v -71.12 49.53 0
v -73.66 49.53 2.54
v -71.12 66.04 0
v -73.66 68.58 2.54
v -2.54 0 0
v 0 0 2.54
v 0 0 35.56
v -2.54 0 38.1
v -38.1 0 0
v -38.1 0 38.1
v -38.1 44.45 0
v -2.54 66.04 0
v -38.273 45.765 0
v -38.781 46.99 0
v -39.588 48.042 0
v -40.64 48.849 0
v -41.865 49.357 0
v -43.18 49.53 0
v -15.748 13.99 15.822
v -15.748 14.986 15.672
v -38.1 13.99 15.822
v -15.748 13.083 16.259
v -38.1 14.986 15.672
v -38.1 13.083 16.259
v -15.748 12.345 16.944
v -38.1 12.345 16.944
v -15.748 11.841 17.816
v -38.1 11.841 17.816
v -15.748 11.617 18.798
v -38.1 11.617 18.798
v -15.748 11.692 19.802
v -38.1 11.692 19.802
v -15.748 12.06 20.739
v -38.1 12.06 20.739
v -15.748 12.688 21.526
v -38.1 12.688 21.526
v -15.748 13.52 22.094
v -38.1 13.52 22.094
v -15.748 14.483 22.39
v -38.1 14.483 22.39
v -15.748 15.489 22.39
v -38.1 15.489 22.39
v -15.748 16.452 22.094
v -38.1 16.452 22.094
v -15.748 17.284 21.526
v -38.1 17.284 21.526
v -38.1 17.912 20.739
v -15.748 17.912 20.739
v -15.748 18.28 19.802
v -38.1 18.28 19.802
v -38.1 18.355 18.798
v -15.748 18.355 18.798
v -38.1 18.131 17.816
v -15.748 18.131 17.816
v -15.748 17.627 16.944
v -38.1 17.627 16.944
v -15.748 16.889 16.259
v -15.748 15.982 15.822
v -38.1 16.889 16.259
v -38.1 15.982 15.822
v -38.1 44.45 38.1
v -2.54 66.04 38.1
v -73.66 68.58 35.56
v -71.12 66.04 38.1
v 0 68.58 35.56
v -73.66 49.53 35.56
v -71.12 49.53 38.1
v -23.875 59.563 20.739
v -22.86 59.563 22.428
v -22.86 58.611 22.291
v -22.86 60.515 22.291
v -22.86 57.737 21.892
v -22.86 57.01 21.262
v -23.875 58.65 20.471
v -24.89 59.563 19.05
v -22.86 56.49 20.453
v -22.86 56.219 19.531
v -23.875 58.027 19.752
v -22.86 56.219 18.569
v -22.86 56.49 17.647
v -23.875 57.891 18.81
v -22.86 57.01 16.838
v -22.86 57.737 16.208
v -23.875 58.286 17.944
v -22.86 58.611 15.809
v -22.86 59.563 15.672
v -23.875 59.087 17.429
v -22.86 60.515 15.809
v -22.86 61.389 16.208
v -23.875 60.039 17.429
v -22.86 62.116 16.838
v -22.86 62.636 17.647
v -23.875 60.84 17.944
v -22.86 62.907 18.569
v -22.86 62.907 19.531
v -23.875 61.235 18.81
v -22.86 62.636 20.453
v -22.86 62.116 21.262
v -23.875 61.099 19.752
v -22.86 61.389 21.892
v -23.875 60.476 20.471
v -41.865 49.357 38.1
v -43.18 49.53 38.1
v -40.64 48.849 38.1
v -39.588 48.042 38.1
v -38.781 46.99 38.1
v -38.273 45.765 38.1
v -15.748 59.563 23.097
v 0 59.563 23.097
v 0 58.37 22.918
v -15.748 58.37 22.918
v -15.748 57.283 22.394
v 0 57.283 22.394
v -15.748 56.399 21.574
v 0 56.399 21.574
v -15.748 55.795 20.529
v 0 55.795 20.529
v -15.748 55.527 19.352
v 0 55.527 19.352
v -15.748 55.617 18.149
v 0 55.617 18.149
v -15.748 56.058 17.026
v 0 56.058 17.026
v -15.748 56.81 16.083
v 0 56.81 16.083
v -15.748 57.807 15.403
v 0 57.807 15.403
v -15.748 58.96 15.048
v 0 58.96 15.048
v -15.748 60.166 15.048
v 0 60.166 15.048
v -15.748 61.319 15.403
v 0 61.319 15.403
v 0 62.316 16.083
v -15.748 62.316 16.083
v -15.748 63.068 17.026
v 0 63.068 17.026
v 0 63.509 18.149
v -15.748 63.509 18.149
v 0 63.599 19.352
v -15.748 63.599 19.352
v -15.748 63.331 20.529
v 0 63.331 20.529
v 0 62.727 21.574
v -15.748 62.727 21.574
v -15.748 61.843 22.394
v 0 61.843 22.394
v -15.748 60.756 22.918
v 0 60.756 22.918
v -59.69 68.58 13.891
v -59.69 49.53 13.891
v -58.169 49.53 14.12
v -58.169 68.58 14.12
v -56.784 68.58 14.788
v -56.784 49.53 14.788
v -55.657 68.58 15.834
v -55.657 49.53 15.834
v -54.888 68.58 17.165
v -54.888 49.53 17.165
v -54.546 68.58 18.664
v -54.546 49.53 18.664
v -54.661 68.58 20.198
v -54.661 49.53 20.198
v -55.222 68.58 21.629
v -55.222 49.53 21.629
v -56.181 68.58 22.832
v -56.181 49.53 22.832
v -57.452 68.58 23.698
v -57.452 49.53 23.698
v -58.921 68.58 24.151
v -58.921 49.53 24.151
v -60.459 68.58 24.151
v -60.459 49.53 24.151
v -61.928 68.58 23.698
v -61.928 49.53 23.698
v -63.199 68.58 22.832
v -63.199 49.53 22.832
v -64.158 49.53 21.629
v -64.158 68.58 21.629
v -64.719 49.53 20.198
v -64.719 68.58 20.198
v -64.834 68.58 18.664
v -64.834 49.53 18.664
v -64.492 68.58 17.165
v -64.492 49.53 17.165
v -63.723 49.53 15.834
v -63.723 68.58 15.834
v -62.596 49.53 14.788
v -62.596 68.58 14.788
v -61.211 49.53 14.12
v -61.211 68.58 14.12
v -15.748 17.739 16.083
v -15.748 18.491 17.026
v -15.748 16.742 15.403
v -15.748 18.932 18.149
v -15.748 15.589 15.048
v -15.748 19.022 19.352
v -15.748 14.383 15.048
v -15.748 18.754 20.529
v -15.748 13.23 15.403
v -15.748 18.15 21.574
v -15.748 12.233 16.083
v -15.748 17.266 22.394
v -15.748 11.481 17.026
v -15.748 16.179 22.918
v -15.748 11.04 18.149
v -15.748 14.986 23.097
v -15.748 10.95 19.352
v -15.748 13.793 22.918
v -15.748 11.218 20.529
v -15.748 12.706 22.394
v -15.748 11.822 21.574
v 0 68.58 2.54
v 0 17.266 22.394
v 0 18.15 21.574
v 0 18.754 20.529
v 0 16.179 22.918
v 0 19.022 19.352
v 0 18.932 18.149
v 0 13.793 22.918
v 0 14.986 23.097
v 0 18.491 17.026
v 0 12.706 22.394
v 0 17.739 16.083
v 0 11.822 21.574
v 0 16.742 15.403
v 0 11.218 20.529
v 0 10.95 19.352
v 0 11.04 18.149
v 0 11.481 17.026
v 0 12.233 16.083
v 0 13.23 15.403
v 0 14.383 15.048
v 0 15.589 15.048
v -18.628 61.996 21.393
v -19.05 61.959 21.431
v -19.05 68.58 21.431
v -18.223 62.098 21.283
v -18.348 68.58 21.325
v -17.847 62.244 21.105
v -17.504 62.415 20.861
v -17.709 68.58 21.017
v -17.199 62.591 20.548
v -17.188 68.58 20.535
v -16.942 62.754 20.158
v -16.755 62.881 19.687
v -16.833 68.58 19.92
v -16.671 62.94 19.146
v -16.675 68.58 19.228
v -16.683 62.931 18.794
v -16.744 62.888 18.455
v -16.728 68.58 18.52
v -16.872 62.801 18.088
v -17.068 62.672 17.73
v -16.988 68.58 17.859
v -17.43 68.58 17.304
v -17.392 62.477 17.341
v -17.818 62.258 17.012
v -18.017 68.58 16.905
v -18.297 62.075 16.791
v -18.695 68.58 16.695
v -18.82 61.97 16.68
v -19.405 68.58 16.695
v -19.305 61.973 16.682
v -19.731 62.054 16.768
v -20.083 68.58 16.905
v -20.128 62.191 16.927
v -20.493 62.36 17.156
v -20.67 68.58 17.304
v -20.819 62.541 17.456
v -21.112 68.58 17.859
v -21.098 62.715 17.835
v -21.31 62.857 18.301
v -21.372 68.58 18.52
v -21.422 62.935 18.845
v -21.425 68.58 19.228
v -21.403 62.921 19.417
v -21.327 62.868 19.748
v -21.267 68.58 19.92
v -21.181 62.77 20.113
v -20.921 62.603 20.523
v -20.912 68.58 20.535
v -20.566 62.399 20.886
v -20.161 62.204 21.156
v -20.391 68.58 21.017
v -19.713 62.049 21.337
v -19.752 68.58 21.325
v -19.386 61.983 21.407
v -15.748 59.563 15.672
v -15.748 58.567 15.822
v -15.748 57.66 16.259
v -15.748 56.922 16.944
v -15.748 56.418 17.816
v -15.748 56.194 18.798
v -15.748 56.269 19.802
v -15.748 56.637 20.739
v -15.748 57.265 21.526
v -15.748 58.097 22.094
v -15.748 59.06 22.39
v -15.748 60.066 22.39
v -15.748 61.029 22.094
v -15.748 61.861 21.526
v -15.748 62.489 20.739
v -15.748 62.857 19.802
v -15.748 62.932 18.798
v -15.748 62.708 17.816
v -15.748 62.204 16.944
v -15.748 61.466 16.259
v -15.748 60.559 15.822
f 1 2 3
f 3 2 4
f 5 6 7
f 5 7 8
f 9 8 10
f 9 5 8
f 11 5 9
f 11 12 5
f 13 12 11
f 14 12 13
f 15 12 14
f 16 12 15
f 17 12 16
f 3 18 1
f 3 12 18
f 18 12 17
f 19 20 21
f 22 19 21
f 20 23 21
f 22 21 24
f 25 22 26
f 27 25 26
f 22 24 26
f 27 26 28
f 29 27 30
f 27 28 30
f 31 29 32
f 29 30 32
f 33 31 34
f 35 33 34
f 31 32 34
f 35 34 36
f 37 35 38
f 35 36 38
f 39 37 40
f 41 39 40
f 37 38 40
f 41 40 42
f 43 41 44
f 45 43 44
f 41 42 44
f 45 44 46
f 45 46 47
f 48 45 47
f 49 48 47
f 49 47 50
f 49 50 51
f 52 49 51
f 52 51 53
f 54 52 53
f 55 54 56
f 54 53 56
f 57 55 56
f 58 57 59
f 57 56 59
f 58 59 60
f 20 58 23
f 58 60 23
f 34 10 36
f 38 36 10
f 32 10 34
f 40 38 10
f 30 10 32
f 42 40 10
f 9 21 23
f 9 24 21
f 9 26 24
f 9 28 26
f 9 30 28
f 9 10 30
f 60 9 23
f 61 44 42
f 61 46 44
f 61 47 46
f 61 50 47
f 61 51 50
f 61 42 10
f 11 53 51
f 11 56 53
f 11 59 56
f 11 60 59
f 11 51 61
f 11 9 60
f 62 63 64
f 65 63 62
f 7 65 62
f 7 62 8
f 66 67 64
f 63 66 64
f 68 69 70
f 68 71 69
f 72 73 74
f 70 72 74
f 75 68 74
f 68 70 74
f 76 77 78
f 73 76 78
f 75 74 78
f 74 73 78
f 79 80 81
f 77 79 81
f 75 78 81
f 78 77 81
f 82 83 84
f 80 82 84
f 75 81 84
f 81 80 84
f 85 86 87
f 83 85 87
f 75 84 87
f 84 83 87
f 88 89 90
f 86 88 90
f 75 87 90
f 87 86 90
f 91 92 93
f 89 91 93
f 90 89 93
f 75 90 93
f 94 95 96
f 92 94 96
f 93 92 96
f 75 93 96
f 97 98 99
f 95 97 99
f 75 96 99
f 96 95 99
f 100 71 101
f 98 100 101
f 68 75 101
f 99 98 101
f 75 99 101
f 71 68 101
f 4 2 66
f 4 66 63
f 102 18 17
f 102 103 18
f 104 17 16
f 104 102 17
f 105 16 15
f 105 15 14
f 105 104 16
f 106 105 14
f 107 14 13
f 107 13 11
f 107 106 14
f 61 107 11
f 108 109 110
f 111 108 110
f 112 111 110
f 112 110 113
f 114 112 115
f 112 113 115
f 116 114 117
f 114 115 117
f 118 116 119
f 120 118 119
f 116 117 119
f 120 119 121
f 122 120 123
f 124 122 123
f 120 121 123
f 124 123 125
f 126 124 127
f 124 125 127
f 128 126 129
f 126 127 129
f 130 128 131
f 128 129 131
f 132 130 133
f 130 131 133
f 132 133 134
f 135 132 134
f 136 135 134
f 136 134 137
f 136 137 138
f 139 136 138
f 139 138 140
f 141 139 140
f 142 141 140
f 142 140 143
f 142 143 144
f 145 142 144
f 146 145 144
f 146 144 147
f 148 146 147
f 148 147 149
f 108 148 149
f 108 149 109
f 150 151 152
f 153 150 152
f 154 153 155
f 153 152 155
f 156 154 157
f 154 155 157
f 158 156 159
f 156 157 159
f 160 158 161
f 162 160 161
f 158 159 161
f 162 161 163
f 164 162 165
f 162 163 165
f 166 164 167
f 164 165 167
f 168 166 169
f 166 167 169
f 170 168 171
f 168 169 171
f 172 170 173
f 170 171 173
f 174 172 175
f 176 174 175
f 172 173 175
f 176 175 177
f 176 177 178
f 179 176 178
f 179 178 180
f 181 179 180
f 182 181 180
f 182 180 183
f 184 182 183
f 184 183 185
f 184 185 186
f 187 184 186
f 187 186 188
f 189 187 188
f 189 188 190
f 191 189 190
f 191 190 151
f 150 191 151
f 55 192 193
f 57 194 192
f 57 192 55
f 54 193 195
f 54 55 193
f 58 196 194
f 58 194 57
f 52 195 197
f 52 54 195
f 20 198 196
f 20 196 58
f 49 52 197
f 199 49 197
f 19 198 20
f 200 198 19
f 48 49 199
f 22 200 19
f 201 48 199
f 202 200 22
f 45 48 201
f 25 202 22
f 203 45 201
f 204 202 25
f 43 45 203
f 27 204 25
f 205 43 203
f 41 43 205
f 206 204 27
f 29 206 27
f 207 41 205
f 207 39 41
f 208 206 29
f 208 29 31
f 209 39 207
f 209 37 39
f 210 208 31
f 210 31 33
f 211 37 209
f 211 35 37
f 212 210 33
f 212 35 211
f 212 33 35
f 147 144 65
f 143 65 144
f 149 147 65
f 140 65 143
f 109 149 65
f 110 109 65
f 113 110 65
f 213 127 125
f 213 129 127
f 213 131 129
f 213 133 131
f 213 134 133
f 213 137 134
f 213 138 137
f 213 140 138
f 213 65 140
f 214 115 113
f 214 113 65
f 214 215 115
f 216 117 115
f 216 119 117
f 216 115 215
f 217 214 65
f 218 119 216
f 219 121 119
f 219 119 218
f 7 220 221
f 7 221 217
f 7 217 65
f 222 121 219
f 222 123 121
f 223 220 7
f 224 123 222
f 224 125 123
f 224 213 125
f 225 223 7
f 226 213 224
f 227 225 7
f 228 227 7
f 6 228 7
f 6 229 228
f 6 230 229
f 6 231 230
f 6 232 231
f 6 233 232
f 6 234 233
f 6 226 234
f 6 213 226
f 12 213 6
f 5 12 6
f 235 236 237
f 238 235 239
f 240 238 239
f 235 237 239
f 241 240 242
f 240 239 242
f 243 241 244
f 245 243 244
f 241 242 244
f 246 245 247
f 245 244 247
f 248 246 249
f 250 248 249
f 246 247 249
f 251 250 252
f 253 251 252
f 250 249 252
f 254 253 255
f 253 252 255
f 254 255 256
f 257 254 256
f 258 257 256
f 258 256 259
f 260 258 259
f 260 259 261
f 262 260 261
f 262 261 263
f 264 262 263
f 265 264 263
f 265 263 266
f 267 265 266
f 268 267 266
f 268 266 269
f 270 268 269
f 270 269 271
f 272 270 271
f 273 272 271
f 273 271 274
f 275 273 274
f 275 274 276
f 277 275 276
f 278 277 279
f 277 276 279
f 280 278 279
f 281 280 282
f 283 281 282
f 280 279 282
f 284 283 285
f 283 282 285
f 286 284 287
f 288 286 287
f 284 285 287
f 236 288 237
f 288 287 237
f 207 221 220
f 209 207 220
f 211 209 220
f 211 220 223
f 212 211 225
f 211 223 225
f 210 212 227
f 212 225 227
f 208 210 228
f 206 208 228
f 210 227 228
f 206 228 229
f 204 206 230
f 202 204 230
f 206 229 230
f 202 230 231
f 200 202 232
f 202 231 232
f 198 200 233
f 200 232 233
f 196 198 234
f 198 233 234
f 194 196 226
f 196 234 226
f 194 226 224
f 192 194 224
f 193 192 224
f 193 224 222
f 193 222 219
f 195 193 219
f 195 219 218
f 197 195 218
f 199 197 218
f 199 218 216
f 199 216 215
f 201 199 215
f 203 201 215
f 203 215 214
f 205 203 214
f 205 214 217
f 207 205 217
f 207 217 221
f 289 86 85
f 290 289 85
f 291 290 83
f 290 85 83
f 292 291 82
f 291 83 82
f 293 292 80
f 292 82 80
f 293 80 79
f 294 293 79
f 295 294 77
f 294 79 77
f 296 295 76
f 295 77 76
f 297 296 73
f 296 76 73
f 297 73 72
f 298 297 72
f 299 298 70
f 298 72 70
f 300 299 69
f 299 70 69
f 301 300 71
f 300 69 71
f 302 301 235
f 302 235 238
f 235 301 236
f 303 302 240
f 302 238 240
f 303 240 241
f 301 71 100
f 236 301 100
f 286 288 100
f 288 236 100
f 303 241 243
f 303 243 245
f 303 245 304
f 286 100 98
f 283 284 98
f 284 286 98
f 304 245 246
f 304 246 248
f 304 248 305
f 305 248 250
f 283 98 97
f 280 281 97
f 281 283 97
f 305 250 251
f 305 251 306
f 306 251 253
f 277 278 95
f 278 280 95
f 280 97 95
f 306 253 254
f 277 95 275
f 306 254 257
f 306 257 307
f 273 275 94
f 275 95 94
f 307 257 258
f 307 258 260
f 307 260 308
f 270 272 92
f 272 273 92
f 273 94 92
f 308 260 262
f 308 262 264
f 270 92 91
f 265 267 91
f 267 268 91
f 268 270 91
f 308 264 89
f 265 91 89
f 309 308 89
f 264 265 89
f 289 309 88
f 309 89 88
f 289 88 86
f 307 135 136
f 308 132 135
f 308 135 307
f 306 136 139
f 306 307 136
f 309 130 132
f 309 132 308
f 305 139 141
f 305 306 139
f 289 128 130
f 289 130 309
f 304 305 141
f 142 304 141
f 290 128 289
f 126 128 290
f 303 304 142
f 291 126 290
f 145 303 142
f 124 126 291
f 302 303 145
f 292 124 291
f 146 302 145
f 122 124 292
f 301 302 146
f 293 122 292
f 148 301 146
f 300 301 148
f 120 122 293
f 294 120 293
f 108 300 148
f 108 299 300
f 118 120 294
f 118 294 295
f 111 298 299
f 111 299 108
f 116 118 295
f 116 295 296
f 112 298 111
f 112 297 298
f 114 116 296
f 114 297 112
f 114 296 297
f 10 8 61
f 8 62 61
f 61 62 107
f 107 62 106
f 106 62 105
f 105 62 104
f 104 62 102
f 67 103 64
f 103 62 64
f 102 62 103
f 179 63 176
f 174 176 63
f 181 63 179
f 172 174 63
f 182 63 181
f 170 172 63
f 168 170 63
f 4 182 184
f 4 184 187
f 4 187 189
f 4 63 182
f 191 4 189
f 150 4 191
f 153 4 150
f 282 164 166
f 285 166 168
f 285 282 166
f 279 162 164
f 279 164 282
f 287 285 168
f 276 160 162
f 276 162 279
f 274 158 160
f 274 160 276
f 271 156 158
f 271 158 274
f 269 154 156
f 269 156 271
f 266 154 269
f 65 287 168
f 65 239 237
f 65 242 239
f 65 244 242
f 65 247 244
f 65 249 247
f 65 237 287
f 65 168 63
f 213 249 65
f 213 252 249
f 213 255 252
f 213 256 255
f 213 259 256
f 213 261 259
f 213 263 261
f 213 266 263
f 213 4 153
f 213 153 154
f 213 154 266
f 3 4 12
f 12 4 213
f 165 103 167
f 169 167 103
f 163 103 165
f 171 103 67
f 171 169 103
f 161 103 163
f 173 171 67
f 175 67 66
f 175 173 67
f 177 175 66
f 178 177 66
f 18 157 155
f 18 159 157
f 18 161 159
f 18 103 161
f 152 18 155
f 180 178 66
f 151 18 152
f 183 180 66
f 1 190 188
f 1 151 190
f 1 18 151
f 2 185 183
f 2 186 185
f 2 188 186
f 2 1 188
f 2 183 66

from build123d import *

# Parameters (mm, degrees)
EXTRUDE1_DEPTH                               = 38.1
F_3_8_CLEARANCE_HOLE1_D                      = 10.31748
TAPPED_HOLE_FOR_1_4_20_HELICOIL3_D           = 6.7564
TAPPED_HOLE_FOR_1_4_20_HELICOIL3_DEPTH       = 22.86
TAPPED_HOLE_FOR_1_4_20_HELICOIL3_CBORE_D     = 8.09498
TAPPED_HOLE_FOR_1_4_20_HELICOIL3_CBORE_DEPTH = 15.748
TAPPED_HOLE_FOR_1_4_20_HELICOIL3_TIP         = 2.029827343
TAPPED_HOLE_FOR_1_4_20_HELICOIL1_D           = 6.7564
TAPPED_HOLE_FOR_1_4_20_HELICOIL1_CBORE_D     = 8.09498
TAPPED_HOLE_FOR_1_4_20_HELICOIL1_CBORE_DEPTH = 15.748
FILLET1_R                                    = 5.08
F_3_16_0_1875_DIAMETER_HOLE1_REACH           = 70.58
F_3_16_0_1875_DIAMETER_HOLE1_BORE_R          = 2.38125
CHAMFER1_SIZE                                = 2.54


with BuildPart() as part:
    # Sketch1 → Extrude1 (new body)
    with BuildSketch(Plane.XY):
        Polygon((-73.66, 49.53), (-73.66, 68.58), (0, 68.58), (0, 0), (-38.1, 0), (-38.1, 49.53), align=None)
    extrude(amount=EXTRUDE1_DEPTH)

    # 3/8 Clearance Hole1 (through all)
    with Locations(Plane(origin=(-59.69, 68.58, 19.05), x_dir=(0, 0, 1), z_dir=(0, 1, 0))):
        with Locations((0, 0)):
            Hole(F_3_8_CLEARANCE_HOLE1_D / 2)

    # Tapped Hole for 1/4-20 Helicoil3
    with Locations(Plane(origin=(0, 59.563, 19.05), x_dir=(0, 0, 1), z_dir=(1, 0, 0))):
        with Locations((0, 0)):
            CounterBoreHole(TAPPED_HOLE_FOR_1_4_20_HELICOIL3_D / 2, TAPPED_HOLE_FOR_1_4_20_HELICOIL3_CBORE_D / 2, TAPPED_HOLE_FOR_1_4_20_HELICOIL3_CBORE_DEPTH, depth=TAPPED_HOLE_FOR_1_4_20_HELICOIL3_DEPTH)
            with Locations((0, 0, -(TAPPED_HOLE_FOR_1_4_20_HELICOIL3_DEPTH + TAPPED_HOLE_FOR_1_4_20_HELICOIL3_TIP / 2))):  # 118° drill point
                Cone(0, TAPPED_HOLE_FOR_1_4_20_HELICOIL3_D / 2, TAPPED_HOLE_FOR_1_4_20_HELICOIL3_TIP, mode=Mode.SUBTRACT)

    # Tapped Hole for 1/4-20 Helicoil1 (through all)
    with Locations(Plane(origin=(0, 14.986, 19.05), x_dir=(0, 0, 1), z_dir=(1, 0, 0))):
        with Locations((0, 0)):
            CounterBoreHole(TAPPED_HOLE_FOR_1_4_20_HELICOIL1_D / 2, TAPPED_HOLE_FOR_1_4_20_HELICOIL1_CBORE_D / 2, TAPPED_HOLE_FOR_1_4_20_HELICOIL1_CBORE_DEPTH)

    # Fillet1
    fillet1_edges = [part.edges().sort_by_distance(p)[0] for p in [
        (-38.1, 49.53, 19.05),
    ]]
    fillet(fillet1_edges, radius=FILLET1_R)

    # 3/16 (0.1875) Diameter Hole1 bore (on position points) → 3/16 (0.1875) Diameter Hole1 (cut, up to next)
    with BuildSketch(Plane(origin=(-19.05, 68.58, 19.05), x_dir=(0, 0, 1), z_dir=(0, 1, 0)), mode=Mode.PRIVATE) as f_3_16_0_1875_diameter_hole1_sk1:
        Circle(F_3_16_0_1875_DIAMETER_HOLE1_BORE_R)
    f_3_16_0_1875_diameter_hole1_tool1 = extrude(f_3_16_0_1875_diameter_hole1_sk1.sketch, amount=-F_3_16_0_1875_DIAMETER_HOLE1_REACH, mode=Mode.PRIVATE) & part.part
    add(f_3_16_0_1875_diameter_hole1_tool1.solids().sort_by_distance((-19.05, 68.58, 19.05))[0], mode=Mode.SUBTRACT)

    # Chamfer1
    chamfer1_edges = [part.edges().sort_by_distance(p)[0] for p in [
        (0, 34.29, 38.1),
        (-36.83, 68.58, 38.1),
        (-73.66, 59.055, 38.1),
        (-73.66, 59.055, 0),
        (-36.83, 68.58, 0),
        (0, 34.29, 0),
    ]]
    chamfer(chamfer1_edges, length=CHAMFER1_SIZE)


solid = part.part
